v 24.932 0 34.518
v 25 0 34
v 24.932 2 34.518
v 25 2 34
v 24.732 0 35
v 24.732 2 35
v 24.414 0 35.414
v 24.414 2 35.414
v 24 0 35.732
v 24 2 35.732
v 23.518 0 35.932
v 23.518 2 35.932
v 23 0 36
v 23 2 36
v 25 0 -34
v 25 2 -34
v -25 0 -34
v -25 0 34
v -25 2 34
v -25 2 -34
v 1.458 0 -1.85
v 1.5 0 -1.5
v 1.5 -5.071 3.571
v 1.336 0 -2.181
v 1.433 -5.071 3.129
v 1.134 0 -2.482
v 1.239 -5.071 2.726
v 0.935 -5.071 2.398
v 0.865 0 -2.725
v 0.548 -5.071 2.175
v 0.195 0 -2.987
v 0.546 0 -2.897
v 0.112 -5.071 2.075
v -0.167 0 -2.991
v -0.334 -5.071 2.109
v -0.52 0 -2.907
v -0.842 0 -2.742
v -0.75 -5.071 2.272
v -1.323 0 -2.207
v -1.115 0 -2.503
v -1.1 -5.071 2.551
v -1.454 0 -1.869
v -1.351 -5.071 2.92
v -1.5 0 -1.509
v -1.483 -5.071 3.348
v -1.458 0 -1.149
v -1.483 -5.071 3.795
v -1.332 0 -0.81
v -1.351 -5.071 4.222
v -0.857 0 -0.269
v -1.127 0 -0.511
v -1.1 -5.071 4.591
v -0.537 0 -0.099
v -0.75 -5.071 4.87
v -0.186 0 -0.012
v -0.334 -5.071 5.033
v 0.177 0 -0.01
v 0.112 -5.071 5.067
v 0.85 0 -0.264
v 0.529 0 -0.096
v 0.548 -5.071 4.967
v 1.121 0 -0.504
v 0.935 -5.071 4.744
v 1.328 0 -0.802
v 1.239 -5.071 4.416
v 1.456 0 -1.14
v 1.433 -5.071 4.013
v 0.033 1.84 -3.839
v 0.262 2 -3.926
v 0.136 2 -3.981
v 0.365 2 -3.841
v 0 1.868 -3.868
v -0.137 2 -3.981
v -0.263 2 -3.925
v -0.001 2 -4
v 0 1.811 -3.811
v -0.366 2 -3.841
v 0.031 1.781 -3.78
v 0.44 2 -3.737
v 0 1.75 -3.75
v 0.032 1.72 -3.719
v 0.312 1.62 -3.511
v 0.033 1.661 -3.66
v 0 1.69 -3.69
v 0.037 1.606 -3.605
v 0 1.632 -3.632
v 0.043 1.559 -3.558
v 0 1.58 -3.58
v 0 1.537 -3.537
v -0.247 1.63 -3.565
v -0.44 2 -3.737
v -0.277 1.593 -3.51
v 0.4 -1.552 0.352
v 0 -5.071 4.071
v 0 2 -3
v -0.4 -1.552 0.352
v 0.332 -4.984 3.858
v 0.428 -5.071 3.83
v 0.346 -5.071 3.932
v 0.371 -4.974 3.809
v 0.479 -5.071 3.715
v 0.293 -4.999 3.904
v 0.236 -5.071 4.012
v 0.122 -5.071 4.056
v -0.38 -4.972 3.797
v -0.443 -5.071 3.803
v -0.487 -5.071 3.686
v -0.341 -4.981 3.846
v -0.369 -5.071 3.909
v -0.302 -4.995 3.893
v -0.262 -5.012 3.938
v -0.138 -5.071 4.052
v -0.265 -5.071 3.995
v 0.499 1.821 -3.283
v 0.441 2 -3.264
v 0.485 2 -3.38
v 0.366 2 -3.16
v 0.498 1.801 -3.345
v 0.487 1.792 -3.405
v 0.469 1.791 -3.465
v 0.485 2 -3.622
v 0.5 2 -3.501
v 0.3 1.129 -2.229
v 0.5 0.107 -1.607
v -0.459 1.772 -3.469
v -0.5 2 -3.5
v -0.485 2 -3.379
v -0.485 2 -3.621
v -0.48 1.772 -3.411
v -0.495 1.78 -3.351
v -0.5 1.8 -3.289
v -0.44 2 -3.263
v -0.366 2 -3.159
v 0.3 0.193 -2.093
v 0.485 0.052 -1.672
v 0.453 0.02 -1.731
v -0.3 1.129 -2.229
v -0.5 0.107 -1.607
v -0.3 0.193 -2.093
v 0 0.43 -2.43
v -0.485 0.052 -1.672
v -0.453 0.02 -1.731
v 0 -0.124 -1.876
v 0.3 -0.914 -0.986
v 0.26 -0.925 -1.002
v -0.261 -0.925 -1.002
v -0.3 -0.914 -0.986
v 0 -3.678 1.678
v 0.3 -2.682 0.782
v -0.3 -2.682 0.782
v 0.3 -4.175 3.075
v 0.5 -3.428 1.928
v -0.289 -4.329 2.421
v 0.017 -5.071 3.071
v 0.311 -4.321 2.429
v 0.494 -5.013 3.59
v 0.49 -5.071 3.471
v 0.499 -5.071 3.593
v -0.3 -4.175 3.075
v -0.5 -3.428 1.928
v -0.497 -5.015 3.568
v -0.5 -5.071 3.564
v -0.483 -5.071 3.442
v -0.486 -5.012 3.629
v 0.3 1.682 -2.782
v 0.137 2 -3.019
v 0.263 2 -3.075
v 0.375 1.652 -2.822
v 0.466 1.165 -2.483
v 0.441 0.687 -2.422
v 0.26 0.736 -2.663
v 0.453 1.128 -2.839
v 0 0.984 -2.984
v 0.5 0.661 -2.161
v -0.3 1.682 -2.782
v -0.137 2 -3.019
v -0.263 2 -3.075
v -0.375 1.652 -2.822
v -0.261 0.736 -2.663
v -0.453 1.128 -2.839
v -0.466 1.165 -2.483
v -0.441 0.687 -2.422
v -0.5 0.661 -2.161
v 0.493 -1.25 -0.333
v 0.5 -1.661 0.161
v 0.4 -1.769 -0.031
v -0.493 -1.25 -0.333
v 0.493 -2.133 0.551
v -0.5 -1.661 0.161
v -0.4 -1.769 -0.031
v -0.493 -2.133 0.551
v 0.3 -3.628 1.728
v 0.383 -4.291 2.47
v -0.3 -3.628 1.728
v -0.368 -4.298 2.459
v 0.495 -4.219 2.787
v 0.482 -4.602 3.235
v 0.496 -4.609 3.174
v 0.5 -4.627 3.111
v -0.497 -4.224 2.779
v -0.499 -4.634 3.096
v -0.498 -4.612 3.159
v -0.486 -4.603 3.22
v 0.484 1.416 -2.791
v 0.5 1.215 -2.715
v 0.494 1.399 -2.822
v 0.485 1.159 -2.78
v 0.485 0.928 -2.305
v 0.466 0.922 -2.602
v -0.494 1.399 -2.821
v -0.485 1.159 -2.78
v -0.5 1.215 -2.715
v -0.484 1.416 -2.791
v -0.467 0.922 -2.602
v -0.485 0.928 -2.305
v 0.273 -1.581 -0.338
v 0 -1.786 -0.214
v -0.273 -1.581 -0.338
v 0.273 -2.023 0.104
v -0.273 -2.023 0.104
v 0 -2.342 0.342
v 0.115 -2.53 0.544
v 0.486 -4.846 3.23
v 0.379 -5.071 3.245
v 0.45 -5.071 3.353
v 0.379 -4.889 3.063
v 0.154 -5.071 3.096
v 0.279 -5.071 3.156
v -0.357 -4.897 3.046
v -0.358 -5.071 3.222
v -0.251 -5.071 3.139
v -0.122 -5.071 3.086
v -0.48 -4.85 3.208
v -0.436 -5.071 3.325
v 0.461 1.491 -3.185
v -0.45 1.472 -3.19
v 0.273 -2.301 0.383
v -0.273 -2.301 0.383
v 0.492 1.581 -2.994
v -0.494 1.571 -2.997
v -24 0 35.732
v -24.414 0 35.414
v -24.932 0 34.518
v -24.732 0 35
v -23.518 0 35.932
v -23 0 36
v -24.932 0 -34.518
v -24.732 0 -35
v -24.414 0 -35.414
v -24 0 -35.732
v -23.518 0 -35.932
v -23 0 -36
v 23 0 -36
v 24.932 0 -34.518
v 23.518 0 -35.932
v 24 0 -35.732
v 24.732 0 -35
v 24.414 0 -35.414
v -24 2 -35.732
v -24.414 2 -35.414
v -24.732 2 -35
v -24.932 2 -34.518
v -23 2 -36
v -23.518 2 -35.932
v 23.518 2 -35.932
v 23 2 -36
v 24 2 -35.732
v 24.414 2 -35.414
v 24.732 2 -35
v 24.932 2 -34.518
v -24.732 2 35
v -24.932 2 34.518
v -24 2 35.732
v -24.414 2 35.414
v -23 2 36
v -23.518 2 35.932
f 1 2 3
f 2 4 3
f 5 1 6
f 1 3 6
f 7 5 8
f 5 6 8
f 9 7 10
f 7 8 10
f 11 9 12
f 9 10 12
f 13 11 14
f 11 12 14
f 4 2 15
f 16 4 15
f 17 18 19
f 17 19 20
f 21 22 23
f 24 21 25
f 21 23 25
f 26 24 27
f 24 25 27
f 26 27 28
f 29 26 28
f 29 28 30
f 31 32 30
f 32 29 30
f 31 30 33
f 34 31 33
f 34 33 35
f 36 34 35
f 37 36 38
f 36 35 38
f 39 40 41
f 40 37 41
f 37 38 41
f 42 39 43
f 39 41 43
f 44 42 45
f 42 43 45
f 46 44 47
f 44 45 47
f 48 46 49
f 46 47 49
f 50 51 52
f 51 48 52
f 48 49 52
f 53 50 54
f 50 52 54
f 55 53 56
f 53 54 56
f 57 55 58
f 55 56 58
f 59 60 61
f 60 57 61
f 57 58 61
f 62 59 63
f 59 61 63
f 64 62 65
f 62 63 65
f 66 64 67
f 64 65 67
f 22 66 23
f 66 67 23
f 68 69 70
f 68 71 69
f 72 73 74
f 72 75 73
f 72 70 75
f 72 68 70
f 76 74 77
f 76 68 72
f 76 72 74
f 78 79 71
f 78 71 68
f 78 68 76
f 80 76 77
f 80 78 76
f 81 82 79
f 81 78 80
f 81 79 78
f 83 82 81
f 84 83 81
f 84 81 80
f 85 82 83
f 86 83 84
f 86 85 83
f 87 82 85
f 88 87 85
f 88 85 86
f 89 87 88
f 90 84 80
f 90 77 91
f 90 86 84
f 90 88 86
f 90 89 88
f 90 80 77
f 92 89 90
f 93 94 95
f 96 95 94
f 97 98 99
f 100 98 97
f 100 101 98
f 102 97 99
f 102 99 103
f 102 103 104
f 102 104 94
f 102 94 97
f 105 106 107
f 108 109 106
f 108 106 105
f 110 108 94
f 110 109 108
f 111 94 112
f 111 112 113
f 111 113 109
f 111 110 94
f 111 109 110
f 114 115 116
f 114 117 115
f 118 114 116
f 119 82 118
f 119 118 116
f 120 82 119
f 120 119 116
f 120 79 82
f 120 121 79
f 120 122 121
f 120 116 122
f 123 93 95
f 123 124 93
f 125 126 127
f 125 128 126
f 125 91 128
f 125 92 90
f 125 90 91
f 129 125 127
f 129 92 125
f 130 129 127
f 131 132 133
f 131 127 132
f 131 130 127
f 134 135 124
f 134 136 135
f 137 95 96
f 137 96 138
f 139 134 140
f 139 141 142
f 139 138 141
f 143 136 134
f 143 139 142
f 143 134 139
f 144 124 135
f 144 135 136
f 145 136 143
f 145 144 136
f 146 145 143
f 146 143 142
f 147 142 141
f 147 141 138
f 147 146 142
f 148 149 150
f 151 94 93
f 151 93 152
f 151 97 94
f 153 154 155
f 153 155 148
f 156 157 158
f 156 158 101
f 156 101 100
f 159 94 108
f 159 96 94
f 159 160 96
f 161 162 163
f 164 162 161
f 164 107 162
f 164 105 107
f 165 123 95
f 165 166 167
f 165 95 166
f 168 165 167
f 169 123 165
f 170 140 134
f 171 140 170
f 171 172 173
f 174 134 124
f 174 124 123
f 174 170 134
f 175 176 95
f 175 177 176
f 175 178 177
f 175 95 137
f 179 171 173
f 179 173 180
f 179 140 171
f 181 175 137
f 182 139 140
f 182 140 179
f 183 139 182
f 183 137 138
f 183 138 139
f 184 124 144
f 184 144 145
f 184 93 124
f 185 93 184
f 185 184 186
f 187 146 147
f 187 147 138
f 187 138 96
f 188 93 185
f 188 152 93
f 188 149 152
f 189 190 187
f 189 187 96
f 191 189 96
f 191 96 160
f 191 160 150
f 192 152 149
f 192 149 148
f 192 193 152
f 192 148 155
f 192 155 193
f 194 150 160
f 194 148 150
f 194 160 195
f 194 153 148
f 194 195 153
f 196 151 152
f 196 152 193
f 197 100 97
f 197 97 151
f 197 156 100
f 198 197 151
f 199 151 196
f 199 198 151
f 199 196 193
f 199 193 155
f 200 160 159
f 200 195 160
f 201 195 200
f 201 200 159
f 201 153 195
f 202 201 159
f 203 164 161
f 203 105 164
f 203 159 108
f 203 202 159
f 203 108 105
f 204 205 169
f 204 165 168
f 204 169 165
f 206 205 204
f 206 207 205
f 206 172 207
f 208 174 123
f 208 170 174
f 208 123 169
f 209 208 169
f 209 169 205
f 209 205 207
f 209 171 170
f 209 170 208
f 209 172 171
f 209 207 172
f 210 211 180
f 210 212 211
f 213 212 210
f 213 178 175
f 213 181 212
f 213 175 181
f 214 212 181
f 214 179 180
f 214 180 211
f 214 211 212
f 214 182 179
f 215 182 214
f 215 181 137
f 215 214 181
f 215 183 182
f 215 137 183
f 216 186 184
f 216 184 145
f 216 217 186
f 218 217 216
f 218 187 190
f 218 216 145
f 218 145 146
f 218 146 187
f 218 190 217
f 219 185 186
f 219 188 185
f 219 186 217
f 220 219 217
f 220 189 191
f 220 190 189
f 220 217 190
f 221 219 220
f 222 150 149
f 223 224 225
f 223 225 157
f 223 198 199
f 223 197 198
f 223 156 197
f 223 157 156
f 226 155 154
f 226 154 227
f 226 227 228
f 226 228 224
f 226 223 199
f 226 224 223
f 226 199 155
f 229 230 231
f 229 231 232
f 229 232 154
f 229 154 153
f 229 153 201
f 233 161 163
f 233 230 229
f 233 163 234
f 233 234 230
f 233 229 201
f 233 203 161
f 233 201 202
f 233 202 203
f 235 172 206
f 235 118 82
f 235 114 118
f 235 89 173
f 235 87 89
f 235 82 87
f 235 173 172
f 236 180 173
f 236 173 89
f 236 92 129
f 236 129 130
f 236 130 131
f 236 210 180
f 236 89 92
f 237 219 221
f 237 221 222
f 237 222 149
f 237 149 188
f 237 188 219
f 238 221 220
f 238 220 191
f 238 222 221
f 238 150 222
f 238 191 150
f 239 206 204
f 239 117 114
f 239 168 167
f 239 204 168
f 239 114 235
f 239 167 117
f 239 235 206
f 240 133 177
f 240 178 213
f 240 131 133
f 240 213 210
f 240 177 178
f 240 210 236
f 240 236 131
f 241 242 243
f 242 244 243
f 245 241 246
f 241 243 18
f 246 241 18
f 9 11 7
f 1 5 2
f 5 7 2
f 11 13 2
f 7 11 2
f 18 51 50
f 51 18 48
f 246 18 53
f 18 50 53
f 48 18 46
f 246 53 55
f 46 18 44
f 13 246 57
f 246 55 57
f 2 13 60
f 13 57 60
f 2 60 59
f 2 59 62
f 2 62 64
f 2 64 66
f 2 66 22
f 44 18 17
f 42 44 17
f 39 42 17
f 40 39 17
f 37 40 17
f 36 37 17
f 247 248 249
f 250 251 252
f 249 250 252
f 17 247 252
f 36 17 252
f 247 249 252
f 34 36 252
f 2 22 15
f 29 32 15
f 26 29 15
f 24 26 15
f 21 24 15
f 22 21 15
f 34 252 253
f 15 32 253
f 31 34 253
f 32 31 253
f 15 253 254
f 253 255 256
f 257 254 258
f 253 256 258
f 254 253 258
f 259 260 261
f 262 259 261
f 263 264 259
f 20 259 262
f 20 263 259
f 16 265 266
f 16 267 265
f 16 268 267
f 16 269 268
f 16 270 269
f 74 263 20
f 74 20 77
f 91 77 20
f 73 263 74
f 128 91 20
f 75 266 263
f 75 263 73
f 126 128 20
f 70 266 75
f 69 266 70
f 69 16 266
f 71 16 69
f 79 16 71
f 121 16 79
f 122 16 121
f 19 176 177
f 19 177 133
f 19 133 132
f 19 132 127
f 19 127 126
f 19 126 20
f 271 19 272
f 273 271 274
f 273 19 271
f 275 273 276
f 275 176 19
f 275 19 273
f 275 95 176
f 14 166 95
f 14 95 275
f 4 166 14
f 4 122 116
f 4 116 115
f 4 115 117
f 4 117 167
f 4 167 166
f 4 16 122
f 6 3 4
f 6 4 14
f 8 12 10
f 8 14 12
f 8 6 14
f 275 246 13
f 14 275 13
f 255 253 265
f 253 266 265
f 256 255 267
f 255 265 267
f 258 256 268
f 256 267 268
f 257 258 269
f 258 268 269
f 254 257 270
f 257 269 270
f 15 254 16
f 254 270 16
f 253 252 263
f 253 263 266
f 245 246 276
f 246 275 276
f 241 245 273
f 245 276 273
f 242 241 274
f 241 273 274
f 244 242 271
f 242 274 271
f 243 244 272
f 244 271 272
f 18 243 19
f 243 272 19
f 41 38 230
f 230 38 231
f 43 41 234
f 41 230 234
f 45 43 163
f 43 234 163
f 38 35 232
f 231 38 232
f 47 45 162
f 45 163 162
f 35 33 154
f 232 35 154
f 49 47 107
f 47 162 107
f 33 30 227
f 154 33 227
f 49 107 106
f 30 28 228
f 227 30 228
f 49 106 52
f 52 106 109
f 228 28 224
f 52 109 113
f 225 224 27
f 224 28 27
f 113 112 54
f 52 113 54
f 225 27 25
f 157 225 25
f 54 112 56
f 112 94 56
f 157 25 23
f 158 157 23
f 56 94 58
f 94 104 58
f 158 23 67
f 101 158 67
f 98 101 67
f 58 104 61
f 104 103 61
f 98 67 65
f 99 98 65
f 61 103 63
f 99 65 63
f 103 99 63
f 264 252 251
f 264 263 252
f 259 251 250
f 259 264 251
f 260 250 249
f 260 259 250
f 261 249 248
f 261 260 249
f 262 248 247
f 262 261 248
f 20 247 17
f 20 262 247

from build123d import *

# Parameters (mm, degrees)
PLATFORM_W                   = 50
PLATFORM_H                   = 72
PLATFORM_W_2                 = 22.5
PLATFORM_H_2                 = 43
PLATFORM_HEIGHT_DEPTH        = 2
TUBE_OUTER_DIAMETER_SKETCH_R = 1.5
TUBE_START                   = -6.464466201
TUBE_INNER_DIAMETER_DEPTH    = 10.707106612
FILLET1_R                    = 2


# Read off the part's stored shape, not the designer's step: Tube Inner Diameter
with BuildPart() as part:
    # Platform → Platform Height (new body)
    # profile 1 of 2: a face of its own
    with BuildSketch(Plane(origin=(0, 0, 0), x_dir=(1, 0, 0), z_dir=(0, 1, 0))):
        Rectangle(PLATFORM_W, PLATFORM_H)
        Rectangle(PLATFORM_W_2, PLATFORM_H_2, mode=Mode.SUBTRACT)
    # profile 2 of 2: a face of its own
    with BuildSketch(Plane(origin=(0, 0, 0), x_dir=(1, 0, 0), z_dir=(0, 1, 0))):
        Rectangle(PLATFORM_W_2, PLATFORM_H_2)
    extrude(amount=PLATFORM_HEIGHT_DEPTH)

    # Tube Outer Diameter: sweep along a curve in space
    with BuildLine() as tube_outer_diameter_path:
        Line((0, 2, -3.5), (0, -5.071067812, 3.571067812))
    # Tube Outer Diameter Sketch → Tube Outer Diameter (sweep)
    with BuildSketch(Plane(origin=(0, 2, 0), x_dir=(1, 0, 0), z_dir=(0, 1, 0))):
        with Locations((0, 3.5)):
            Circle(TUBE_OUTER_DIAMETER_SKETCH_R)
    sweep(path=tube_outer_diameter_path.line)

    # Tube Inner Diameter outline → Tube Inner Diameter (cut)
    with BuildSketch(Plane(origin=(0, 0, 0), x_dir=(1, 0, 0), z_dir=(0, 0.7071067811865487, -0.7071067811865464)).offset(TUBE_START)):
        with BuildLine():
            add(Edge.make_bspline(
                [(0, 0.707106781), (1, 0.707106781), (1, 1.414213562), (0, 1.414213562), (-1, 1.414213562), (-1, 0.707106781), (0, 0.707106781)],
                knots=[0, 0, 0, 0, 0.5, 0.5, 0.5, 1, 1, 1, 1], degree=3, weights=[1, 0.333333333, 0.333333333, 1, 0.333333333, 0.333333333, 1]))
        make_face()
    extrude(amount=TUBE_INNER_DIAMETER_DEPTH, mode=Mode.SUBTRACT)

    # Fillet1
    fillet1_edges = [part.edges().sort_by_distance(p)[0] for p in [
        (-25, 1, 36),
        (-25, 1, -36),
        (25, 1, -36),
        (25, 1, 36),
    ]]
    fillet(fillet1_edges, radius=FILLET1_R)


solid = part.part
